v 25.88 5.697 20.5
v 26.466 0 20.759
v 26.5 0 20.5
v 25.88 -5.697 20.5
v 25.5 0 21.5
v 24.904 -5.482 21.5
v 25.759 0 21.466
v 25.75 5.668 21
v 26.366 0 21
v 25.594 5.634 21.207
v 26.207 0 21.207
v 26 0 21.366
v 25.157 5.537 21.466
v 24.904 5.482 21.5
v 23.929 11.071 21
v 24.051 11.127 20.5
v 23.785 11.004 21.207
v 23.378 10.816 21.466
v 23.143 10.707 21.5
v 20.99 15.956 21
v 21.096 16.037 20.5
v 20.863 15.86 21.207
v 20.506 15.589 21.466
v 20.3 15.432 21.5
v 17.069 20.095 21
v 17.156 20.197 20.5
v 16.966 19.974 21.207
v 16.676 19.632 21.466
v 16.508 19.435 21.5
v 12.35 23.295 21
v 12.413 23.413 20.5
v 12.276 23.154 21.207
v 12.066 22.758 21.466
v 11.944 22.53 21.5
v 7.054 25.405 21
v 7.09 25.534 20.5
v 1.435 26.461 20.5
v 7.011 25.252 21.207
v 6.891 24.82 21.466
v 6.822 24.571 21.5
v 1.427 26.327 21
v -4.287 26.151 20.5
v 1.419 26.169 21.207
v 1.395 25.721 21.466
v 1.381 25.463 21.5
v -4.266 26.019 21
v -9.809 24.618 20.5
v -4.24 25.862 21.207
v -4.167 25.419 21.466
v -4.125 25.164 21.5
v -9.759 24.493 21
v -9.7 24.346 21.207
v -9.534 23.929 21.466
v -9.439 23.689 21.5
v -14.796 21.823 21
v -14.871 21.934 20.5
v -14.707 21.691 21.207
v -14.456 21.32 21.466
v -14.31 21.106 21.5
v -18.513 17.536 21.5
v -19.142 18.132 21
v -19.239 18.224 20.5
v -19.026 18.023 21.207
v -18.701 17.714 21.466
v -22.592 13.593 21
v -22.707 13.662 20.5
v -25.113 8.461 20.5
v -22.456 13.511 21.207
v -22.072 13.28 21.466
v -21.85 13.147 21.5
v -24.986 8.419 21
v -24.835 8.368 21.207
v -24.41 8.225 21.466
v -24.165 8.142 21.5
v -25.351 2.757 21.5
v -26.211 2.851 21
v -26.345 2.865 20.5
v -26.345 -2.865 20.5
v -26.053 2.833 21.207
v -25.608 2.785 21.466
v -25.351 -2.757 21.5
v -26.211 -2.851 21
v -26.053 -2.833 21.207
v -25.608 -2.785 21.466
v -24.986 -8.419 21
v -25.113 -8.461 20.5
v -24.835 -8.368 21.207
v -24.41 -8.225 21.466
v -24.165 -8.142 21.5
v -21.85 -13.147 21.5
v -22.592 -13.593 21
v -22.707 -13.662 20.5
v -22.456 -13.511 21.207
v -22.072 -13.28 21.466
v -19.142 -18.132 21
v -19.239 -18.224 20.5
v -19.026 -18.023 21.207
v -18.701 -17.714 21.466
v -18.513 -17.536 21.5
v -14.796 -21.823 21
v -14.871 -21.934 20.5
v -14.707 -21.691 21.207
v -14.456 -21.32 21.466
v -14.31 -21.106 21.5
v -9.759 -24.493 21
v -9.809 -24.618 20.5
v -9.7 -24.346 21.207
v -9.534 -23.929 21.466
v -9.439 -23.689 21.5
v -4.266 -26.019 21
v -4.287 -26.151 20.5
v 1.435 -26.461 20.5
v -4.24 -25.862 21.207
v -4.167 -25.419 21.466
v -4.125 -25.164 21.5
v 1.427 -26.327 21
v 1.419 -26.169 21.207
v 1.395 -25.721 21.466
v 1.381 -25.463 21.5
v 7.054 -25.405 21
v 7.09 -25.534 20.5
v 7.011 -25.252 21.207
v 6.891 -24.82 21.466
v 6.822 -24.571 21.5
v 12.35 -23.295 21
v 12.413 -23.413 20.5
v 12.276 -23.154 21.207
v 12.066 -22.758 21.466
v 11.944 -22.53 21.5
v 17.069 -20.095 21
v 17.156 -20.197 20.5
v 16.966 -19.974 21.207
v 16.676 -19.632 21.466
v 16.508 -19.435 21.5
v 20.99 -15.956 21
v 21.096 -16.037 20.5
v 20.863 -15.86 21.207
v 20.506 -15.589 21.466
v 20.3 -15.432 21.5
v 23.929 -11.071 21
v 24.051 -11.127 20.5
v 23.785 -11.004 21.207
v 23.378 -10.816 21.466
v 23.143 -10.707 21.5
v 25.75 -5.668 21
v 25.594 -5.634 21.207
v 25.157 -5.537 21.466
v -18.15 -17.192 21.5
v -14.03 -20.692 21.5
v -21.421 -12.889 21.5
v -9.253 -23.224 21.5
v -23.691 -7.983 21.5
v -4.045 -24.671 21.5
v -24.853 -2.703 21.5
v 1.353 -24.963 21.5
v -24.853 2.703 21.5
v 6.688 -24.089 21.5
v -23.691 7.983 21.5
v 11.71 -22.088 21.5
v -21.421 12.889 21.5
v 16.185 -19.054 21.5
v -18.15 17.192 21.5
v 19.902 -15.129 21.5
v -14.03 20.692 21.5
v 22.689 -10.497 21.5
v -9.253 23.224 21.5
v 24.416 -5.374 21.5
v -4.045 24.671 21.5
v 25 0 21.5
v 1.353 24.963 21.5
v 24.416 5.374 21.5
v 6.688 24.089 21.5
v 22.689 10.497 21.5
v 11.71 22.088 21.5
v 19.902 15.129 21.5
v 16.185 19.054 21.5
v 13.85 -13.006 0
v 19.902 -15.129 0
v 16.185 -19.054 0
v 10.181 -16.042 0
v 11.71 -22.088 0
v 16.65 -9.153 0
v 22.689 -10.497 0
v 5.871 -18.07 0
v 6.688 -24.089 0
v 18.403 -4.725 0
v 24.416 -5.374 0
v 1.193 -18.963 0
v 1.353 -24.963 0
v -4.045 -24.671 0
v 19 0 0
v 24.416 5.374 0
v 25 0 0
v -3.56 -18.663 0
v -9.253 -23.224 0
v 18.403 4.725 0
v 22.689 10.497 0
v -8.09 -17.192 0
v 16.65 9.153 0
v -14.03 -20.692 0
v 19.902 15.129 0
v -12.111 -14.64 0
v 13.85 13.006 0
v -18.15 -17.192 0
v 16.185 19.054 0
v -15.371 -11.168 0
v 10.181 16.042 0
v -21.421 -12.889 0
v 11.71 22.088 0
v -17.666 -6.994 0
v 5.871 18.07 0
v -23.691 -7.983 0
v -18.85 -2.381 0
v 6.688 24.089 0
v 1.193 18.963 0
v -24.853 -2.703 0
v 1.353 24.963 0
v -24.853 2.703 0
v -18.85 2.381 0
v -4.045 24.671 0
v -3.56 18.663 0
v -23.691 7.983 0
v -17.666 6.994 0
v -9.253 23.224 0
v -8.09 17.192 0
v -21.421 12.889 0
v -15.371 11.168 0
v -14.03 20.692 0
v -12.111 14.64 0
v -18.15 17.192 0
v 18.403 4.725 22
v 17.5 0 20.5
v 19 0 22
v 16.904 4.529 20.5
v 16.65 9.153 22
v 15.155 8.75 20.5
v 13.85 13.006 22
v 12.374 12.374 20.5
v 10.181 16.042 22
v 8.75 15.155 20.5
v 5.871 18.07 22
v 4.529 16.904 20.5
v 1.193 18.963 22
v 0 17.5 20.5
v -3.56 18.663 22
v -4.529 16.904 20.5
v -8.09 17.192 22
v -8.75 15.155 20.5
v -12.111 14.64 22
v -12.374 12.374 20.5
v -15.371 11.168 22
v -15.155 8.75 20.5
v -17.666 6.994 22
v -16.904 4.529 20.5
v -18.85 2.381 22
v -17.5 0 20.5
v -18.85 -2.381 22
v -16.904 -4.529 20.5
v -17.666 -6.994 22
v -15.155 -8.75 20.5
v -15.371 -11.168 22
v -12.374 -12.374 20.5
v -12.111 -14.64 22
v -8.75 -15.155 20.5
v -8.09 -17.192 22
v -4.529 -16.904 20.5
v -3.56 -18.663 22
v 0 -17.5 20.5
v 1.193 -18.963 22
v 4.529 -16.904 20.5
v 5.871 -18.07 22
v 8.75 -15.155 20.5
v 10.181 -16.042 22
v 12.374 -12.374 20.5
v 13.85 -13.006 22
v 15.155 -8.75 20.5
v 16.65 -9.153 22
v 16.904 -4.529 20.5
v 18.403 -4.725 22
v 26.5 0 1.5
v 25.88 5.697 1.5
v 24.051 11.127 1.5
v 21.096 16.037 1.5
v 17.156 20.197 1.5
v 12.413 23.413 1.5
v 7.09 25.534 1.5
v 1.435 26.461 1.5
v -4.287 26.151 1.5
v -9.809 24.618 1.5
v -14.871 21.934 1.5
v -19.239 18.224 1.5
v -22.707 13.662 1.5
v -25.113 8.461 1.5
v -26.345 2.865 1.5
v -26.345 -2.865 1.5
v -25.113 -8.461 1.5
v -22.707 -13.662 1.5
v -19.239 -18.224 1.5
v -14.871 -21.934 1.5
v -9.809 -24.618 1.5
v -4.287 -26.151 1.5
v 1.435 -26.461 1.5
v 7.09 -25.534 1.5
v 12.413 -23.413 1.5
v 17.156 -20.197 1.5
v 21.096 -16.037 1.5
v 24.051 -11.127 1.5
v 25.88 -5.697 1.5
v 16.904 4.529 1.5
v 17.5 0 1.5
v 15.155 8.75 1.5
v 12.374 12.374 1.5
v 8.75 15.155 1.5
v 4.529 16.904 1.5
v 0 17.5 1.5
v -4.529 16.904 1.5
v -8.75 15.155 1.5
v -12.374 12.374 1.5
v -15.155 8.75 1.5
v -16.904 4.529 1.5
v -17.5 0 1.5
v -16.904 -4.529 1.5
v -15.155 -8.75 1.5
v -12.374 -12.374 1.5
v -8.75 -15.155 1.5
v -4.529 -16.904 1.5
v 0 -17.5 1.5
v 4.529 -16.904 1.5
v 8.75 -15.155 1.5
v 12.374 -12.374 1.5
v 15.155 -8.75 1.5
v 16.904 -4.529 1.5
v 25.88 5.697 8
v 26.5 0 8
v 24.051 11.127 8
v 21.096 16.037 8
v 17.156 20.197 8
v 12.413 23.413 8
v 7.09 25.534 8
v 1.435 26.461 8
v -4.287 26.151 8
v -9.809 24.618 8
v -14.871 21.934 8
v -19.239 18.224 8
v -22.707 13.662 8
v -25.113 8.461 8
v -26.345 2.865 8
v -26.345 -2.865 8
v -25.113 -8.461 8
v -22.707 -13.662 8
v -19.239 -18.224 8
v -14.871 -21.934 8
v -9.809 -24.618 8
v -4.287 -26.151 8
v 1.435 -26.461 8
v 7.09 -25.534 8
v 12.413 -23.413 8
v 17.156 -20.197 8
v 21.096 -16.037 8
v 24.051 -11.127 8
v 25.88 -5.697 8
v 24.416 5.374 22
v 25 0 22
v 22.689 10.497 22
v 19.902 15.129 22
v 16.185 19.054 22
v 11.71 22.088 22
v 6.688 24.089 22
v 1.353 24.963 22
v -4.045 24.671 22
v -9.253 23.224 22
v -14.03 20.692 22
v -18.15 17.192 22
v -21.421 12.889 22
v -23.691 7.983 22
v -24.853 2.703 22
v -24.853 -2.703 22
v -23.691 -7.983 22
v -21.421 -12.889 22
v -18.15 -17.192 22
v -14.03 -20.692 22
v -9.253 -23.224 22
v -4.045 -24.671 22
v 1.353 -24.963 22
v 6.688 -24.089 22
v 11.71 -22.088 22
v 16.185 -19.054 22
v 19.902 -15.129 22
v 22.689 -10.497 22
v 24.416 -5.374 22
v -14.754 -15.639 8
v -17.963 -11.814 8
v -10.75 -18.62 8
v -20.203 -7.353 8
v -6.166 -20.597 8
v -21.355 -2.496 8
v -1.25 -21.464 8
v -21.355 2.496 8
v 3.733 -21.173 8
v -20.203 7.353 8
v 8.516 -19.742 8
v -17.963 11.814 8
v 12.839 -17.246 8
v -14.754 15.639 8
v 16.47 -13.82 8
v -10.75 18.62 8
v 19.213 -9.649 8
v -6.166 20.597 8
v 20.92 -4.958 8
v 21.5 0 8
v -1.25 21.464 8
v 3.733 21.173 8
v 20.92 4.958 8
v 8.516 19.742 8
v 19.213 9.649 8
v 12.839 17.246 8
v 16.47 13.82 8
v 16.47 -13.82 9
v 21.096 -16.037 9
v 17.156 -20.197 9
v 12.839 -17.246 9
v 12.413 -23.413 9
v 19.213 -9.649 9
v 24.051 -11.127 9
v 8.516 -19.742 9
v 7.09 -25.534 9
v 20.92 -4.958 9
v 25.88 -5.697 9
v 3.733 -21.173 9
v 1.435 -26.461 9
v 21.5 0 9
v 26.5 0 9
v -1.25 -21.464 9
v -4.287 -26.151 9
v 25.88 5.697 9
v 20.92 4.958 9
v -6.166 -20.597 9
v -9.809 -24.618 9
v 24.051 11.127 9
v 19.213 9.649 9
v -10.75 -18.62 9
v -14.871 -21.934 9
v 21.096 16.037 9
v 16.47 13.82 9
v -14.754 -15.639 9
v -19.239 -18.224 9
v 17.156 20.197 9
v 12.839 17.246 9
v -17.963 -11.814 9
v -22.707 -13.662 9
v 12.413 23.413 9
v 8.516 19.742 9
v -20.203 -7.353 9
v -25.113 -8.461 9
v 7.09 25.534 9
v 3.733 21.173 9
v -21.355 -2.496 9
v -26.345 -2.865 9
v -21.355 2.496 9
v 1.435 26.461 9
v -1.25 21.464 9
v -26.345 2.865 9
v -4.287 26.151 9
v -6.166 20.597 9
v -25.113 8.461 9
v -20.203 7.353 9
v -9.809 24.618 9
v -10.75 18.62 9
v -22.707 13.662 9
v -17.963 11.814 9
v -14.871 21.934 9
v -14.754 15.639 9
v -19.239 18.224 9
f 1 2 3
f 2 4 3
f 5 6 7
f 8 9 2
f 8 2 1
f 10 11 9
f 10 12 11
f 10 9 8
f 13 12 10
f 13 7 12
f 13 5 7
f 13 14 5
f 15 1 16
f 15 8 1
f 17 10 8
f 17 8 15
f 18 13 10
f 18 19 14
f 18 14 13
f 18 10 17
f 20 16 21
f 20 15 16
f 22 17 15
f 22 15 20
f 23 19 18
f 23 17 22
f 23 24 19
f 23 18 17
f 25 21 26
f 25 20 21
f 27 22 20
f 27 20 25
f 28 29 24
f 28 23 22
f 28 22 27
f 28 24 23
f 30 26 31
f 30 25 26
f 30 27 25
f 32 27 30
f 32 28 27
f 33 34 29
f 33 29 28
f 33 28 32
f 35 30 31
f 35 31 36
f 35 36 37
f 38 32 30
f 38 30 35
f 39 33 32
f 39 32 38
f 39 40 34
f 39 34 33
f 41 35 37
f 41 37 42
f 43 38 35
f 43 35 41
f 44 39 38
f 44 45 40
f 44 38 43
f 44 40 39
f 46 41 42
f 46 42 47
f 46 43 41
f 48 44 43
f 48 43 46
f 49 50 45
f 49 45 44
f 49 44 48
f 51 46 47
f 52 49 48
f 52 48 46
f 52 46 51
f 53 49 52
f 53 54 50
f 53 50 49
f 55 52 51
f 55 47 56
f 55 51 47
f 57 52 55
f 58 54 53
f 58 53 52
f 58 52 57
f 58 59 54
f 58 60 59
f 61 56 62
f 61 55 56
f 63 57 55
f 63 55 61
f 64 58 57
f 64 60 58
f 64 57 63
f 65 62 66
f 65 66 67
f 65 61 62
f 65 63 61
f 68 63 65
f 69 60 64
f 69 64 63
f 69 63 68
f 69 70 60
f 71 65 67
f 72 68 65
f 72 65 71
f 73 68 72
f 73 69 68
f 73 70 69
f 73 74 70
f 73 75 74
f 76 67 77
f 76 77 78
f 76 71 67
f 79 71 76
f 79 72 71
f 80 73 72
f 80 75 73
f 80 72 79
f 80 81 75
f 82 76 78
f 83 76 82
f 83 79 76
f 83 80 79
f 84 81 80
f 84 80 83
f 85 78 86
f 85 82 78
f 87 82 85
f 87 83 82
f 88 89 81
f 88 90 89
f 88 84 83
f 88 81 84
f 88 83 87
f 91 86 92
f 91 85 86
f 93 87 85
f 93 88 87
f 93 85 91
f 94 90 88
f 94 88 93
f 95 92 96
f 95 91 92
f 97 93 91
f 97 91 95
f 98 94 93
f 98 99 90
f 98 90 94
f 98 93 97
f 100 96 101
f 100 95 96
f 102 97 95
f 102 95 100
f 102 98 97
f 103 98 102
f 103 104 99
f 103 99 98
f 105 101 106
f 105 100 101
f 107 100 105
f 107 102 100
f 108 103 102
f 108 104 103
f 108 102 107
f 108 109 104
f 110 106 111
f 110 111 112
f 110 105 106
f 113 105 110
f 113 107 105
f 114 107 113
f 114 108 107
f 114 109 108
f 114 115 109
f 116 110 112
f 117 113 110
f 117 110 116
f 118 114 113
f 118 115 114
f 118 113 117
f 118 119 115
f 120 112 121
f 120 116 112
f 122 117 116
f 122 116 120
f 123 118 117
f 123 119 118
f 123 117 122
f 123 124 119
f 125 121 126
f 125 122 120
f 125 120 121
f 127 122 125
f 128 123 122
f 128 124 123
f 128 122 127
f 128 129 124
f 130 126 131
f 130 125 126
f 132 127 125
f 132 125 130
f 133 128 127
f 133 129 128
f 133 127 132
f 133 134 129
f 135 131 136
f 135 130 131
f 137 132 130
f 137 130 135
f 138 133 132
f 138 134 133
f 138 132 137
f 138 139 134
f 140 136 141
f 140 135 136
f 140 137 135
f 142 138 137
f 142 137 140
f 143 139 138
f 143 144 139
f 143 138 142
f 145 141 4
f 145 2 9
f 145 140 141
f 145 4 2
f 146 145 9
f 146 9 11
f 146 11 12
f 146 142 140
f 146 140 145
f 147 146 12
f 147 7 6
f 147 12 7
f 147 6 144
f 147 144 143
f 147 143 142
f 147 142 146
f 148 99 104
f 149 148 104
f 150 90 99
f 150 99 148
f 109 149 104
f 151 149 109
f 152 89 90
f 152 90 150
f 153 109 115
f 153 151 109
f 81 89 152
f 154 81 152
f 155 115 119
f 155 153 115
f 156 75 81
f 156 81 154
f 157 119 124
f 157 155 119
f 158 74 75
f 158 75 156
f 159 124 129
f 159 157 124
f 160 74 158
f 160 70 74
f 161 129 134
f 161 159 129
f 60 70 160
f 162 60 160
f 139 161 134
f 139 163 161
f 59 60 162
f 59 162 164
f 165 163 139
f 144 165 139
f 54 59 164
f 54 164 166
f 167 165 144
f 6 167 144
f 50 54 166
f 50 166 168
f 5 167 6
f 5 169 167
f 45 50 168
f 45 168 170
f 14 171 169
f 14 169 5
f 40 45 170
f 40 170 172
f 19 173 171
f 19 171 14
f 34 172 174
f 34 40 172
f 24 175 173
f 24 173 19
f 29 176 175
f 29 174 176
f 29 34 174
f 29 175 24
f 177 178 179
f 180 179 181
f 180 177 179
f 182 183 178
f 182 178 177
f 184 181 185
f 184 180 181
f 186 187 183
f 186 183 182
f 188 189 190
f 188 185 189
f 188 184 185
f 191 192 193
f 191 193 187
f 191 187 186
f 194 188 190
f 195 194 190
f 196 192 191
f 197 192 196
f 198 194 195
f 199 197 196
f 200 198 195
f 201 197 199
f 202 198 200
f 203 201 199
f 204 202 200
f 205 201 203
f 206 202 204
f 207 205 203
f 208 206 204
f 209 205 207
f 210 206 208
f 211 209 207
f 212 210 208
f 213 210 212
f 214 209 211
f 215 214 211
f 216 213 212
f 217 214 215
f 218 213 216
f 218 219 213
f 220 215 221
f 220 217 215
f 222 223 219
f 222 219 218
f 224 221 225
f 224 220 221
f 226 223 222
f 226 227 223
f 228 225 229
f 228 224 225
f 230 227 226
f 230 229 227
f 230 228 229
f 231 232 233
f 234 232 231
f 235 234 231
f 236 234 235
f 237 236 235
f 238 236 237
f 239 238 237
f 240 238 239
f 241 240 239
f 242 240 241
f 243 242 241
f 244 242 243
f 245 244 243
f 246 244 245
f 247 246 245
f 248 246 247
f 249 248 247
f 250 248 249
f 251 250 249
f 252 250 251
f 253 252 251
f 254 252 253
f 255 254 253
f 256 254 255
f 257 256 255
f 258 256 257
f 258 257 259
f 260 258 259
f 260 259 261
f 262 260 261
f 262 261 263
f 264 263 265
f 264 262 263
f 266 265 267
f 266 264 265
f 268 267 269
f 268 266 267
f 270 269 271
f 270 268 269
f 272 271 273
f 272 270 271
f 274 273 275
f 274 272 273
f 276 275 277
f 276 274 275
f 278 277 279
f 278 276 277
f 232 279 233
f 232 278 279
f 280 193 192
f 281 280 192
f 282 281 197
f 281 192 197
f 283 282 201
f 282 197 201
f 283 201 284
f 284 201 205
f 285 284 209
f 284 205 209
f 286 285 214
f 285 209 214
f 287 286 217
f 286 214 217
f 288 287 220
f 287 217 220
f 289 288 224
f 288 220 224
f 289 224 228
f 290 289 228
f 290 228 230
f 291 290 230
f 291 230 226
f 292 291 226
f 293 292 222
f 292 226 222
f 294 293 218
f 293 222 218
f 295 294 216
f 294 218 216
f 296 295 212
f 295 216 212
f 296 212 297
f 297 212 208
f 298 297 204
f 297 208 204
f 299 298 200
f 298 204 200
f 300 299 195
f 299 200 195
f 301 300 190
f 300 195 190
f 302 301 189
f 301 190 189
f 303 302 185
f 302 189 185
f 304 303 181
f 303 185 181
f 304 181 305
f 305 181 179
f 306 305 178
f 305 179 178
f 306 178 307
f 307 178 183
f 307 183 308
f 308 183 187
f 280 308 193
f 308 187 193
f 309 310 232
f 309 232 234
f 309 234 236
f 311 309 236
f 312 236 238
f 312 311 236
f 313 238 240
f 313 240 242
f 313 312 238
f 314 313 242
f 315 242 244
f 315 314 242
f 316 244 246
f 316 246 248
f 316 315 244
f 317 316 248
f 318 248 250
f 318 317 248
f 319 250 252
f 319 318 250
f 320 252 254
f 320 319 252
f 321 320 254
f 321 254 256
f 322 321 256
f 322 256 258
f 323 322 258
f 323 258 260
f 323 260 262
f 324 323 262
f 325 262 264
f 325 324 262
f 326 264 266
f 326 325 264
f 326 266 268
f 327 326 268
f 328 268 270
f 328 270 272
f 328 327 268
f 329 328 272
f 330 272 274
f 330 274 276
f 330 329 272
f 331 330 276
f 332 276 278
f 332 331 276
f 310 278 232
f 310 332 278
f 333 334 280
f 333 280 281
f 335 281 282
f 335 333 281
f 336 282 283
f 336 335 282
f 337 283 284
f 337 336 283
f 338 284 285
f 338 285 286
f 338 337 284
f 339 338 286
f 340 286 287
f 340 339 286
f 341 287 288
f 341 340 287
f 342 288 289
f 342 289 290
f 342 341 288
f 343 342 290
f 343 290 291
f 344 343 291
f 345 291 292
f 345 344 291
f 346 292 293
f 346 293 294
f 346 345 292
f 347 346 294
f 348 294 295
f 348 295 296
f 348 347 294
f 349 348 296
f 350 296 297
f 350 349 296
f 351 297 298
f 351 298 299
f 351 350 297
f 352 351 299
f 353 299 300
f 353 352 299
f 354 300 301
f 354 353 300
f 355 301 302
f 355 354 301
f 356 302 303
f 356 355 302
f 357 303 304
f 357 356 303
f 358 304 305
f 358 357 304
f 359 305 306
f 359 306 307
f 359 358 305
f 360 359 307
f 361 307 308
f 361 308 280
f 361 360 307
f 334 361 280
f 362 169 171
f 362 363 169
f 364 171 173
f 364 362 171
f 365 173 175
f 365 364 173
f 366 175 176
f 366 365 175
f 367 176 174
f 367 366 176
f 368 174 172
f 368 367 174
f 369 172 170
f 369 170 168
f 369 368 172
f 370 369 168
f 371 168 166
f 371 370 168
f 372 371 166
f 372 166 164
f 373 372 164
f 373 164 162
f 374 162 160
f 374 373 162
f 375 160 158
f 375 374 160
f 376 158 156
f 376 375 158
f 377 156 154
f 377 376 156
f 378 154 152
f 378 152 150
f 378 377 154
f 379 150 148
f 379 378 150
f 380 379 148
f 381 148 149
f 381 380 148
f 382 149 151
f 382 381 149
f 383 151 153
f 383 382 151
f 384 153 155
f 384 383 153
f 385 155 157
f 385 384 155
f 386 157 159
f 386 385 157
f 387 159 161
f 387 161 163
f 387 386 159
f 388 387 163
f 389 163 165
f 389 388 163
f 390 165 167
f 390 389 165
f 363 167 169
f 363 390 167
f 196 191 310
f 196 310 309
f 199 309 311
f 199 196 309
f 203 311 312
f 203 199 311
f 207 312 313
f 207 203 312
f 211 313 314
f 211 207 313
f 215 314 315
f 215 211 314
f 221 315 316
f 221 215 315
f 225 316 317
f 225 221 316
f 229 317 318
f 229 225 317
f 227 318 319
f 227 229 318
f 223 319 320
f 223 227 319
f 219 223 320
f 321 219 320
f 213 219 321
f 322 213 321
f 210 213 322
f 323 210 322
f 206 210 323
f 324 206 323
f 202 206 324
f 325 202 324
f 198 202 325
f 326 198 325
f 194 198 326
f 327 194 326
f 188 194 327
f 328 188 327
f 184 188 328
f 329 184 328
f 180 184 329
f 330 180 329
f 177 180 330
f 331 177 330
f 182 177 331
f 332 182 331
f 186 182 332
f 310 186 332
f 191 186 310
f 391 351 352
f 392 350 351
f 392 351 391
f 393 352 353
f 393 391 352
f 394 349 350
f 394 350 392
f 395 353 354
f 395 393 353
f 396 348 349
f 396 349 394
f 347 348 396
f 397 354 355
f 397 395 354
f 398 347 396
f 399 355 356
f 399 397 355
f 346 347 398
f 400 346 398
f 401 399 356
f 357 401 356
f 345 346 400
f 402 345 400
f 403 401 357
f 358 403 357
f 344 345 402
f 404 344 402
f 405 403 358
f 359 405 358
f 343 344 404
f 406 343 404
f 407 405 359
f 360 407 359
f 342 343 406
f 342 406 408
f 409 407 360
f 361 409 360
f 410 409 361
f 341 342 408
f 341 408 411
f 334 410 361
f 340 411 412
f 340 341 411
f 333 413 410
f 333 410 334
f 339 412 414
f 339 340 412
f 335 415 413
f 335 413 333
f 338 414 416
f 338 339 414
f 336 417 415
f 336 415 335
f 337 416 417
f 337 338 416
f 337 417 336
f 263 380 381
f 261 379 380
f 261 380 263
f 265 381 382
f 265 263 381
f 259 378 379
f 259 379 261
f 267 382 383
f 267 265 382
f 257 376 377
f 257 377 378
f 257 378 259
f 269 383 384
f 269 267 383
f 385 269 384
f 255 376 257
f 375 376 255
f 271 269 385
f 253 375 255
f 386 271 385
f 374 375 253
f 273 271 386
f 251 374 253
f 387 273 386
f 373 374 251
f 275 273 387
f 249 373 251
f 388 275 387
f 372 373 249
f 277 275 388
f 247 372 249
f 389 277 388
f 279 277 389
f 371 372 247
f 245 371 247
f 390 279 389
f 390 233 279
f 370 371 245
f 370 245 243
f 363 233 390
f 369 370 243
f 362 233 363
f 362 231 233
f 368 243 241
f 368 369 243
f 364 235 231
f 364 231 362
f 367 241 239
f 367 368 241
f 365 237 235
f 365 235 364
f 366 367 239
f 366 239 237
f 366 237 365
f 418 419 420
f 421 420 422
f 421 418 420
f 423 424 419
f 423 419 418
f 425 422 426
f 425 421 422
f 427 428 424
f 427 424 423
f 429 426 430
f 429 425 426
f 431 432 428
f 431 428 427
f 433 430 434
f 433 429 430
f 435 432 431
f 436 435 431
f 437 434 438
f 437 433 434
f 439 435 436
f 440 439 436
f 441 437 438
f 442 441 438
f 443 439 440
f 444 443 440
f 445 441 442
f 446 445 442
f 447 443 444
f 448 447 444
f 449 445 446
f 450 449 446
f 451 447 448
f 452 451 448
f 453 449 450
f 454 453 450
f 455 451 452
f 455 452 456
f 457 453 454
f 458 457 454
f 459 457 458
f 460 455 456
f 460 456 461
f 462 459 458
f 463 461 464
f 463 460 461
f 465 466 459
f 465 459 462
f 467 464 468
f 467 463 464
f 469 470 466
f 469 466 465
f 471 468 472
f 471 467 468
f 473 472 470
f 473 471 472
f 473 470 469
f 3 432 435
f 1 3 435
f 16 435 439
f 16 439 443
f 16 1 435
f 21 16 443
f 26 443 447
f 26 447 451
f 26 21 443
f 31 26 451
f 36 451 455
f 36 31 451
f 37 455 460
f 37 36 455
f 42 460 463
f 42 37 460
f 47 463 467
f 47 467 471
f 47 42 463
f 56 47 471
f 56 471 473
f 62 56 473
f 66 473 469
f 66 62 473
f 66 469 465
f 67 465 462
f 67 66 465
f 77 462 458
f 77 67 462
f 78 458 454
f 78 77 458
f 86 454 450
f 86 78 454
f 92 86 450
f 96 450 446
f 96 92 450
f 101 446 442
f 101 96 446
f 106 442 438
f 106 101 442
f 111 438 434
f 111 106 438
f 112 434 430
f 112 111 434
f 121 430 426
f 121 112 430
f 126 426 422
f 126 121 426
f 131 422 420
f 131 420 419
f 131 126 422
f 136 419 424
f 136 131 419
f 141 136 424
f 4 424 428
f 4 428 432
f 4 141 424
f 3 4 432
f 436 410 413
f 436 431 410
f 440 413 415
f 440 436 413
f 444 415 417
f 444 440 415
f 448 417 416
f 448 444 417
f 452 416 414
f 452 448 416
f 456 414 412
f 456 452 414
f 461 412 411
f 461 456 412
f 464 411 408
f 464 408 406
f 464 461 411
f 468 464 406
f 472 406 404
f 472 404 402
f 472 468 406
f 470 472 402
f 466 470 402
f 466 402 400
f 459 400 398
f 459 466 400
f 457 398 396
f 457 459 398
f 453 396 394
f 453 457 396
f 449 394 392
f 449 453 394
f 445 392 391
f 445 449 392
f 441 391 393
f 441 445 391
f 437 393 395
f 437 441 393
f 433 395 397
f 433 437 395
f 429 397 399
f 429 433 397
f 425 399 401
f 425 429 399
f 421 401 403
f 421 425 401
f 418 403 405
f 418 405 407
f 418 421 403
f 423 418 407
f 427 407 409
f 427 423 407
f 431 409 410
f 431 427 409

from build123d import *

# Parameters (mm, degrees)
F2_R    = 1
F3_SIZE = 1.5


with BuildPart() as f1:
    # F0 (on Front) → F1 (revolve)
    with BuildSketch(Plane.XZ):
        Polygon((17.5, 22), (17.5, 0), (26.5, 0), (26.5, 8), (21.5, 8), (21.5, 9), (26.5, 9), (26.5, 21.5), (25, 21.5), (25, 22), align=None)
    revolve(axis=Axis((0, 0, 2.07143), (0, 0, 1)))

    # F2
    f2_edges = [f1.edges().sort_by_distance(p)[0] for p in [
        (-26.5, 0, 21.5),
    ]]
    fillet(f2_edges, radius=F2_R)

    # F3
    f3_edges = [f1.edges().sort_by_distance(p)[0] for p in [
        (-26.5, 0, 0),
        (-17.5, 0, 22),
        (-17.5, 0, 0),
    ]]
    chamfer(f3_edges, length=F3_SIZE)


solid = f1.part
